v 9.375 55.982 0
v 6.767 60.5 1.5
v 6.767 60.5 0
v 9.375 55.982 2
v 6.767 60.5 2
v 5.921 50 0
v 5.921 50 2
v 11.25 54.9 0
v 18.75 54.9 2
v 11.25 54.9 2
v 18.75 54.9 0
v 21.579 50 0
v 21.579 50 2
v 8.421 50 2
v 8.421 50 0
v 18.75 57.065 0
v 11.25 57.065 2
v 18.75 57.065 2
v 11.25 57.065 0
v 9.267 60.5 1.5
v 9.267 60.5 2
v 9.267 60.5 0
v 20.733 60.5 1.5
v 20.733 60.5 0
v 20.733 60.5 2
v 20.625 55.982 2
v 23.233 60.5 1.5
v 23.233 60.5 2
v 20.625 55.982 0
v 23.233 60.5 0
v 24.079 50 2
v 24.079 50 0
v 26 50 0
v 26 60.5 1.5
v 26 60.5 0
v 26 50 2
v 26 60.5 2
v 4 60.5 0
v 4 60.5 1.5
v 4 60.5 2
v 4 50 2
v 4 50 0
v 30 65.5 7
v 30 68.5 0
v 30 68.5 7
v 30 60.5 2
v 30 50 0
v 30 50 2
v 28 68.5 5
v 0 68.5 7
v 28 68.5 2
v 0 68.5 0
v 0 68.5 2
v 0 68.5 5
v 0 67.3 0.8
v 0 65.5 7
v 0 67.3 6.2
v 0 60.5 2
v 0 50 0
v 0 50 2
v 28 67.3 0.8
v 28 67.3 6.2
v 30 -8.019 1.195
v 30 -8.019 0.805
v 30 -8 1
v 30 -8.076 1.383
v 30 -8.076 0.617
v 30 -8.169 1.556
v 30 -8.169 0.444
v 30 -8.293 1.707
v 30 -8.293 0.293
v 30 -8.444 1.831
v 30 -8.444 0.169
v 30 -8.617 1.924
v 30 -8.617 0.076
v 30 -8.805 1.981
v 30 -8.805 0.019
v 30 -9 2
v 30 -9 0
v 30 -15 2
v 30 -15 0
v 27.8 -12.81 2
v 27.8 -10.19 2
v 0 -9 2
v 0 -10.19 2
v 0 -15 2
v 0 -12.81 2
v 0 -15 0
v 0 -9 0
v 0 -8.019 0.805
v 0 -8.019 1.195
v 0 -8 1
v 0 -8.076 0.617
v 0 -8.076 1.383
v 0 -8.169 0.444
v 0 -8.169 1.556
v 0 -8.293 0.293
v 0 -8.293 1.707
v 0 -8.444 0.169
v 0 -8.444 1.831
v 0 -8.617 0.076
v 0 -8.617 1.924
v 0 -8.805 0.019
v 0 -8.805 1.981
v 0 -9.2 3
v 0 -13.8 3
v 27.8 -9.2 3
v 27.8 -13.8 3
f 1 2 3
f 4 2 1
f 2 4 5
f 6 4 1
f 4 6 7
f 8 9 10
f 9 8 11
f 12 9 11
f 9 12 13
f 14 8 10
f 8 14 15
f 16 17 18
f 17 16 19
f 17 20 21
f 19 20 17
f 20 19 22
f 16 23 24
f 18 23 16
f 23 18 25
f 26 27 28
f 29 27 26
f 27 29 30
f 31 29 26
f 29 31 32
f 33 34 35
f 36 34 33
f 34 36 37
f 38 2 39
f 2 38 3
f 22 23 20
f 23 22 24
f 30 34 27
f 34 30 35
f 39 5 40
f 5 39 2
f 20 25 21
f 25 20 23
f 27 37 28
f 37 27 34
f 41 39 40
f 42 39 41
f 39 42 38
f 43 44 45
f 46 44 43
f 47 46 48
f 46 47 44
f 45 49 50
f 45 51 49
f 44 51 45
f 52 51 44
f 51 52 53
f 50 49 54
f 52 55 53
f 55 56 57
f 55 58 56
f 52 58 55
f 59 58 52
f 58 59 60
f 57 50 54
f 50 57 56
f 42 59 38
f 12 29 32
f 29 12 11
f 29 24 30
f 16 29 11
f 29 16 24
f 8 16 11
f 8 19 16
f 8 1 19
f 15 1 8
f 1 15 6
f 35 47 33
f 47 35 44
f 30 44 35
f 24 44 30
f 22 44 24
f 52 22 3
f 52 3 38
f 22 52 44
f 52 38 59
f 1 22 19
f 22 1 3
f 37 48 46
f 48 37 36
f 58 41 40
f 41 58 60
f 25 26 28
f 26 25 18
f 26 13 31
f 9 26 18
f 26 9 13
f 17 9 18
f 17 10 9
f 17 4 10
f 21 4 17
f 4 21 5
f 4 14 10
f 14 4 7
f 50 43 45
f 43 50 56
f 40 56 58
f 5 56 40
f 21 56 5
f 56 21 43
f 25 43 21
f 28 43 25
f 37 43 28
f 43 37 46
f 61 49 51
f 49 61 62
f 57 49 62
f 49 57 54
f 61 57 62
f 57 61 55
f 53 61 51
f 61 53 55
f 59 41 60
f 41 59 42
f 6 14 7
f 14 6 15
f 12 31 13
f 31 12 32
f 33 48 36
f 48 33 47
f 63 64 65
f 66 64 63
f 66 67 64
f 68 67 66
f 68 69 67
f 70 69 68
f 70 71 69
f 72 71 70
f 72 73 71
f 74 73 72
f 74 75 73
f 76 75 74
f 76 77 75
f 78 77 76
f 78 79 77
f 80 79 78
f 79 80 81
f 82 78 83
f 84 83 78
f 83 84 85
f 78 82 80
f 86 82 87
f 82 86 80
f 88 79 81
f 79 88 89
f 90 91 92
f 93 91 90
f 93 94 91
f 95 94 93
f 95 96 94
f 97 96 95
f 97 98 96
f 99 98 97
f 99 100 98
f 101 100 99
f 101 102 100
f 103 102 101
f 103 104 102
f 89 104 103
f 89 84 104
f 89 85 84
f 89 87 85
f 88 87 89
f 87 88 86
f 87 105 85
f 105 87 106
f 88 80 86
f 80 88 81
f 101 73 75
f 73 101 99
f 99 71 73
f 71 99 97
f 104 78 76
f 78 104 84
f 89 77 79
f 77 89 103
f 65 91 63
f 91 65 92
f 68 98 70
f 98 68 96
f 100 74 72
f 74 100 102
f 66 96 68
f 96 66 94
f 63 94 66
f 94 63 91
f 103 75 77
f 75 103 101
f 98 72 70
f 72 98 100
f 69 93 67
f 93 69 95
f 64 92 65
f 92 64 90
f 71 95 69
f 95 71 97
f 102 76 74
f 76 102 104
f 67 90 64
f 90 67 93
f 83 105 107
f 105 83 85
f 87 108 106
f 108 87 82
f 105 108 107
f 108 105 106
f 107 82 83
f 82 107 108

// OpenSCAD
// Wake split design: top lip printed flat, slides into dovetail rail
part      = "print";   // "assembled" | "print" | "body" | "lip"
test_mode = true;      // true = 30mm coupon slice, false = full riser

width           = test_mode ? 30 : 175;
back_height     = 70.5;
bottom_lip_depth= 20;
wall            = 2;

hex_size   = 15;
hex_gap    = 2.5;
border_x      = 4;
border_bottom = 6;

fillet_r = 1.5;

brand_text   = "BlueBytes";
version_text = "Wake v27";
tag_size     = 3.5;
tag_depth    = 0.5;
tag_font     = "Liberation Sans:style=Bold";
tag_margin_x = 10;
tag_margin_y = 6;

// rail + dovetail
rail_d    = 5;     // extra depth behind panel
rail_t    = 3;     // rail thickness at its free tip
dt_neck   = 2.6;   // tongue width at base
dt_h      = 1.0;   // tongue height (45 deg flanks)
dt_clear  = 0.2;   // clearance per side
dt_stop   = 2;     // solid end wall of the blind groove

lip_d      = wall + rail_d;
rail_top   = back_height - wall;
rail_z_tip = rail_top - rail_t;
rail_z0    = rail_z_tip - rail_d;   // 45 deg underside, prints without supports

$fn = 32;

module hex_grid(w, h) {
    pitch  = hex_size + hex_gap;
    step_x = pitch * 0.75;
    step_z = pitch * 0.866;
    cx = w / 2;
    cz = h / 2;
    ncols = ceil(w / (2 * step_x)) + 2;
    nrows = ceil(h / (2 * step_z)) + 2;
    for (col = [-ncols : ncols]) {
        x = cx + col * step_x;
        parity = ((col % 2) + 2) % 2;
        z_offset = (parity == 0) ? 0 : step_z / 2;
        for (row = [-nrows : nrows]) {
            z = cz + row * step_z + z_offset;
            translate([x, wall / 2, z])
                rotate([90, 0, 0])
                    cylinder(d = hex_size, h = wall + 4, center = true, $fn = 6);
        }
    }
}

module hex_pattern(w, h) {
    intersection() {
        hex_grid(w, h);
        cube([w, wall + 4, h]);
    }
}

module back_panel() {
    difference() {
        cube([width, wall, rail_top]);
        translate([border_x, -1, border_bottom])
            hex_pattern(width - 2 * border_x, rail_z0 - border_bottom);
    }
}

module rail() {
    rotate([90, 0, 90]) linear_extrude(width)
        polygon([[0.5, rail_z0], [0, rail_z0], [-rail_d, rail_z_tip],
                 [-rail_d, rail_top], [0.5, rail_top]]);
}

module groove() {
    mw = dt_neck / 2 + dt_clear;
    gd = dt_h + dt_clear;
    bw = mw + gd;
    yc = (wall - rail_d) / 2;
    translate([-1, 0, 0]) rotate([90, 0, 90]) linear_extrude(width - dt_stop + 1)
        polygon([[yc - mw, rail_top + 1], [yc - mw, rail_top],
                 [yc - bw, rail_top - gd], [yc + bw, rail_top - gd],
                 [yc + mw, rail_top], [yc + mw, rail_top + 1]]);
}

module rounded_lip(w, depth) {
    r = wall / 2;
    union() {
        cube([w, depth - r, wall]);
        translate([0, depth - r, r])
            rotate([0, 90, 0])
                cylinder(r = r, h = w, $fn = 32);
    }
}

module bottom_lip() { rounded_lip(width, bottom_lip_depth); }

module outer_round(y0, z0, r) {
    translate([0, y0, z0])
        difference() {
            cube([width, r, r]);
            translate([0, r, r])
                rotate([0, 90, 0])
                    cylinder(r = r, h = width, $fn = 64);
        }
}

module tag_text(txt, x_pos) {
    translate([x_pos, bottom_lip_depth - tag_margin_y, wall - tag_depth])
        rotate([0, 0, 180])
            linear_extrude(height = tag_depth + 0.5)
                text(txt, size = tag_size, font = tag_font,
                     halign = "center", valign = "center");
}

module body() {
    difference() {
        union() {
            back_panel();
            rail();
            if (!test_mode) bottom_lip();
        }
        groove();
        if (!test_mode) {
            outer_round(0, 0, fillet_r);
            tag_text(brand_text, width - border_x - tag_margin_x);
            tag_text(version_text, border_x + tag_margin_x);
        }
    }
}

module body_part() {
    if (test_mode)
        intersection() {
            body();
            translate([-1, -10, 50]) cube([width + 2, 30, 30]);
        }
    else body();
}

// local frame: plate on bed (z 0..wall), tongue pointing up
module lip_strip() {
    yc = lip_d / 2;
    nh = dt_neck / 2;
    rounded_lip(width, lip_d);
    rotate([90, 0, 90]) linear_extrude(width - dt_stop - dt_clear)
        polygon([[yc - nh, wall - 0.01], [yc + nh, wall - 0.01],
                 [yc + nh + dt_h, wall + dt_h], [yc - nh - dt_h, wall + dt_h]]);
}

module lip_placed() {
    translate([0, wall, back_height]) rotate([180, 0, 0]) lip_strip();
}

// coupon prints front face down; full body prints bottom lip down
module body_print() {
    if (test_mode) translate([0, 0, wall]) rotate([-90, 0, 0]) body_part();
    else body_part();
}

if (part == "assembled") { body_part(); lip_placed(); }
else if (part == "body") body_print();
else if (part == "lip") lip_strip();
else { body_print(); translate([0, -15, 0]) lip_strip(); }
